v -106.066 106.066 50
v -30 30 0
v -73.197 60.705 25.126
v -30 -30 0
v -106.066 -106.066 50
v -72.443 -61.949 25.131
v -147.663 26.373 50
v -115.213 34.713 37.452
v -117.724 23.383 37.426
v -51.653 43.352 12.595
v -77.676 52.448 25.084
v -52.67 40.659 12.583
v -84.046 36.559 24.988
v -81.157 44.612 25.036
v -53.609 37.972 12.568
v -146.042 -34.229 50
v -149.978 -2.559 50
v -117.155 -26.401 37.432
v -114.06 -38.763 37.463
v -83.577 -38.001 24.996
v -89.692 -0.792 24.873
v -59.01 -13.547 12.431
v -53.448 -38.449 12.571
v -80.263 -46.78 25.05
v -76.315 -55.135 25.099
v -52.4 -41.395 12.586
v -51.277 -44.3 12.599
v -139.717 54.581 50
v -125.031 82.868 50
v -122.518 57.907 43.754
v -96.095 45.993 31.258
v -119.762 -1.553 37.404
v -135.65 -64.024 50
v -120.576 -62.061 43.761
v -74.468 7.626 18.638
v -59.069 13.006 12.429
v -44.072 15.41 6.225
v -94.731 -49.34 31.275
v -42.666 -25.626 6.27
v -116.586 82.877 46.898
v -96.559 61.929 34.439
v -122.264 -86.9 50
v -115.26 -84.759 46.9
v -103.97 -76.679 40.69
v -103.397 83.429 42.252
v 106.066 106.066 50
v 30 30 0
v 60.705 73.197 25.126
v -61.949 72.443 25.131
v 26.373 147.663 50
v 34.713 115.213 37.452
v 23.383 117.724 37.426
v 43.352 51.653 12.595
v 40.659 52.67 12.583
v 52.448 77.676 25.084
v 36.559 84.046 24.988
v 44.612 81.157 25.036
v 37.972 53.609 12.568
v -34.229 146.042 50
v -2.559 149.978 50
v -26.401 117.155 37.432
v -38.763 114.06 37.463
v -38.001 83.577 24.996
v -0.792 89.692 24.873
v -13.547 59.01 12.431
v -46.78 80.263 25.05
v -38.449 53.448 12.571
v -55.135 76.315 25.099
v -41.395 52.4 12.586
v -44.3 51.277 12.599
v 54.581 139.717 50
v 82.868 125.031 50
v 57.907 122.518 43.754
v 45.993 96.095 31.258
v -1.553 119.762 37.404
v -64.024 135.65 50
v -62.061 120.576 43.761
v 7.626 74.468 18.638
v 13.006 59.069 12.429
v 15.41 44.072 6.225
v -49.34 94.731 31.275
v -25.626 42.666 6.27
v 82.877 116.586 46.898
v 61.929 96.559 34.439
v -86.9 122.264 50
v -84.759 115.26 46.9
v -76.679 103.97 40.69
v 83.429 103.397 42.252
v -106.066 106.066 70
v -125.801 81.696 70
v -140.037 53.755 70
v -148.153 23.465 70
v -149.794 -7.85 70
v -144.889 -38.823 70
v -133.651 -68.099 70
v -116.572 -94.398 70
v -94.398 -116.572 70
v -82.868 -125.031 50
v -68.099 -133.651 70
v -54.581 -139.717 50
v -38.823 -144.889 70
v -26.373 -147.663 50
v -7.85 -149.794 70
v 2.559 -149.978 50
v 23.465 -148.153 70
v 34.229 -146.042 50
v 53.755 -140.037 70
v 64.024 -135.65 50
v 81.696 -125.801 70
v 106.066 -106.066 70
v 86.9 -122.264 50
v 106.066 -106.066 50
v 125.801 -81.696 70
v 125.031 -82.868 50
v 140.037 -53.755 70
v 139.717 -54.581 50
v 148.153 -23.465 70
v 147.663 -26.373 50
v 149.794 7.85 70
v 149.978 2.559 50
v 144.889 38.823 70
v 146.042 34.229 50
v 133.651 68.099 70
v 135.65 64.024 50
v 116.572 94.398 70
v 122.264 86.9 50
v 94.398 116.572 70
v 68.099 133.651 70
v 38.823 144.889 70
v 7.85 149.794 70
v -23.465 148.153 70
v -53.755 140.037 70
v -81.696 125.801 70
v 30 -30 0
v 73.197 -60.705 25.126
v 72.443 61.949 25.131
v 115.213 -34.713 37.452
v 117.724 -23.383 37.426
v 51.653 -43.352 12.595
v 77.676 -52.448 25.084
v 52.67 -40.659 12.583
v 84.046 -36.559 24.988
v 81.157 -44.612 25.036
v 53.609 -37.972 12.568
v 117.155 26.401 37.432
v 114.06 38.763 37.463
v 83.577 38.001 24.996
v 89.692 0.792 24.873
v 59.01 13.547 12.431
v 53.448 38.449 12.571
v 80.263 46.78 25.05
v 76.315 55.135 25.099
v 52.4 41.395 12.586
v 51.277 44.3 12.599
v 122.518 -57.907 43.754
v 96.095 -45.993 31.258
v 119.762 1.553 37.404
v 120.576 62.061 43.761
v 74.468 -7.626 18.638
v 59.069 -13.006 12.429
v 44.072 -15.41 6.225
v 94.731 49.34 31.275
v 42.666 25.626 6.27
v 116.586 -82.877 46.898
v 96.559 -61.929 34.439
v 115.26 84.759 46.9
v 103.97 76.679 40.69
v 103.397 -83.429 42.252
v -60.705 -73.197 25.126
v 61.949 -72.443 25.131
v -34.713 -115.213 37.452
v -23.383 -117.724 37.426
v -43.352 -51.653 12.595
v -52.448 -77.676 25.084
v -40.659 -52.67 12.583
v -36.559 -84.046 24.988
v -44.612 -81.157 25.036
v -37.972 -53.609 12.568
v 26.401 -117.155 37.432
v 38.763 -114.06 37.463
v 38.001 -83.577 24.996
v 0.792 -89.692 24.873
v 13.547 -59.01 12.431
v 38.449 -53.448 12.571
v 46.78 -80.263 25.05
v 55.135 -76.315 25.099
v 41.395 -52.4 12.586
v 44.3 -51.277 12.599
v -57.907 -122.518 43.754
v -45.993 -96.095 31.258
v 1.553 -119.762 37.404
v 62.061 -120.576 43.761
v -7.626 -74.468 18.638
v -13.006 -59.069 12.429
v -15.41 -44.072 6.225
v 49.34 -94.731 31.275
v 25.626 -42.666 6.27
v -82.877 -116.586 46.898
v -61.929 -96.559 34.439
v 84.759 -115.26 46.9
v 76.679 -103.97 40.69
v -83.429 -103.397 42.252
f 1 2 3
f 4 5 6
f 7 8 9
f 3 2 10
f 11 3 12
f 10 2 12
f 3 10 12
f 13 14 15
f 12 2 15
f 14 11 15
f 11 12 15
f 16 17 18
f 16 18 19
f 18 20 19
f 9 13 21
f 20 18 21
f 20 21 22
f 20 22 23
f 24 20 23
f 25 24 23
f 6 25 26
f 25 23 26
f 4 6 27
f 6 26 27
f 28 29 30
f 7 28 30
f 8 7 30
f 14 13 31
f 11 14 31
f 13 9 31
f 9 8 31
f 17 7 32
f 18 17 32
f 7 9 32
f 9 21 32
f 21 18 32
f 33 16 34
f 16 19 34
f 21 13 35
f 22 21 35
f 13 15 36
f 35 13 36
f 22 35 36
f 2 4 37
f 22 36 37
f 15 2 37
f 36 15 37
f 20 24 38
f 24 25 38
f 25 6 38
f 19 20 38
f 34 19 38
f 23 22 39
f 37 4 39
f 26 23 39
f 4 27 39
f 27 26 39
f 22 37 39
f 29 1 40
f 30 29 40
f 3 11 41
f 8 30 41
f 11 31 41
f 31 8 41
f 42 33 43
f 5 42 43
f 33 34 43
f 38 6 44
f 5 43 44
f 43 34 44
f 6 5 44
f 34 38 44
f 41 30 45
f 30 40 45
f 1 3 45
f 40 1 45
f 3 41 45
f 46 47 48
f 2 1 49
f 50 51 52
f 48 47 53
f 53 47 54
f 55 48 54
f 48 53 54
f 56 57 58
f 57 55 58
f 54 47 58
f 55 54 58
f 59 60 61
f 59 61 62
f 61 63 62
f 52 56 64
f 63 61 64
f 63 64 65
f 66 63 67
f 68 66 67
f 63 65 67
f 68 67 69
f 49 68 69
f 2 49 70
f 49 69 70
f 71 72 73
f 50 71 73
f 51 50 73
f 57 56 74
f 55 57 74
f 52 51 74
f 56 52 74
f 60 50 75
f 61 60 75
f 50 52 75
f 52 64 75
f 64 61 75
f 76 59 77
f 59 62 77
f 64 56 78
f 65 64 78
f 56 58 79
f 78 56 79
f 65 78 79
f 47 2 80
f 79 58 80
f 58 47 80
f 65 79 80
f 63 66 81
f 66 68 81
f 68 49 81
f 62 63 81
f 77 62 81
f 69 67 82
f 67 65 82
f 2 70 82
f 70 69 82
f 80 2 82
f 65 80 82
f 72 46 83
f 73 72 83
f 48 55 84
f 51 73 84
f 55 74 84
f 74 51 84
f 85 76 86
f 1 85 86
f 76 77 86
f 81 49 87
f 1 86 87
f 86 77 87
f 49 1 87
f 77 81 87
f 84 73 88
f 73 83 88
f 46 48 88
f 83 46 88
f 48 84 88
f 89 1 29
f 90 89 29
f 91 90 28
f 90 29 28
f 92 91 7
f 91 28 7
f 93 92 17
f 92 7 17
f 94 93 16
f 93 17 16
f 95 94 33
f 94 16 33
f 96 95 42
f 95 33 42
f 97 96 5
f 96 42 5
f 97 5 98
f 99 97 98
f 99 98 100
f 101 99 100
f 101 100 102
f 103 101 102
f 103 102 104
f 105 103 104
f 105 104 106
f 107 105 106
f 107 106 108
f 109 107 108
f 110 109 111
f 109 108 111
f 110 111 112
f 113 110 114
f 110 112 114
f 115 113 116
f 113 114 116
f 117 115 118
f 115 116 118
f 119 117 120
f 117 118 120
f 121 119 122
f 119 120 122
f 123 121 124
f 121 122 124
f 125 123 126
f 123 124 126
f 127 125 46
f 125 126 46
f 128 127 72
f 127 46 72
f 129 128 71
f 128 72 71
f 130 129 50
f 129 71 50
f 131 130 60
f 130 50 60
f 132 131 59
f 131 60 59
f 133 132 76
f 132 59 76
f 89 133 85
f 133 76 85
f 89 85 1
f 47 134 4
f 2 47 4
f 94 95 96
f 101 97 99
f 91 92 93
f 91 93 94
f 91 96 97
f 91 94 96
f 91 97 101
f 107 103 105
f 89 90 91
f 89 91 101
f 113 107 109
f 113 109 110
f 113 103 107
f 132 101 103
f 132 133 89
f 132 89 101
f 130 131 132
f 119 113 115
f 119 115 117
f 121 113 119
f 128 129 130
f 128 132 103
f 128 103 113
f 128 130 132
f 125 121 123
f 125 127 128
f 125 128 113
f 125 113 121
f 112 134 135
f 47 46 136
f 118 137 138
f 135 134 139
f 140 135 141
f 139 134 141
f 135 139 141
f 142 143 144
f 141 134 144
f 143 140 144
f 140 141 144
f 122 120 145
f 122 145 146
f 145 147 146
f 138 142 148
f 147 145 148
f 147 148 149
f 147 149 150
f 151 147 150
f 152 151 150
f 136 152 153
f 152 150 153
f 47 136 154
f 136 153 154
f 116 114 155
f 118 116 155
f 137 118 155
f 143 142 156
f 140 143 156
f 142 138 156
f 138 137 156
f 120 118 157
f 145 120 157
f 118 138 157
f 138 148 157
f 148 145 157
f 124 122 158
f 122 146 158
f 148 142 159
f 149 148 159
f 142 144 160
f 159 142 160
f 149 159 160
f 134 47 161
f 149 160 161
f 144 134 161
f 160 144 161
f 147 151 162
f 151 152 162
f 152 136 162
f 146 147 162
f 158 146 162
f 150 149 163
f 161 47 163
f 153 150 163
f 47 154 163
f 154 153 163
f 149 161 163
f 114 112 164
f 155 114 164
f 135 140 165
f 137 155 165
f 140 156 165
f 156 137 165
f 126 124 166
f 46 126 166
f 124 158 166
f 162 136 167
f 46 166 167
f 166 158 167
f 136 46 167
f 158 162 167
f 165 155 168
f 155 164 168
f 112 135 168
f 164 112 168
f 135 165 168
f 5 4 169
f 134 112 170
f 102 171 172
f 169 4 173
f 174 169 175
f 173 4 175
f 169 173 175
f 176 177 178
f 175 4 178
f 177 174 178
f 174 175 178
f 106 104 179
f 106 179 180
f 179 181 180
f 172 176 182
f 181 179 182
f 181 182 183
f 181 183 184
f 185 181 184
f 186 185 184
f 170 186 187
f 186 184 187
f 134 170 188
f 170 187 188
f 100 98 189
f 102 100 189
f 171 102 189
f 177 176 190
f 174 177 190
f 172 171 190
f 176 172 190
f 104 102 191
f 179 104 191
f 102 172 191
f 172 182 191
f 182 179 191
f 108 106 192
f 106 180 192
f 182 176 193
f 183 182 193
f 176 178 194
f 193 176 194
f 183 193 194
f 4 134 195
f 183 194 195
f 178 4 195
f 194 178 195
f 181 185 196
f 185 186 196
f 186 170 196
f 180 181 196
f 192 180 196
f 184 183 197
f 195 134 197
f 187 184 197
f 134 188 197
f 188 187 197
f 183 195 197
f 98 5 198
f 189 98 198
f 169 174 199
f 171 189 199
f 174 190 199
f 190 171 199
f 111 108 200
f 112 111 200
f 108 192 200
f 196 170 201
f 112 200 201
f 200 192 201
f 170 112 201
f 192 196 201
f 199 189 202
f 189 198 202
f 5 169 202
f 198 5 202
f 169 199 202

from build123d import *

# Parameters (mm, degrees)
SKETCH_1_W      = 60
SKETCH_1_H      = 60
EXTRUDE_1_DEPTH = 20


with BuildPart() as part:
    # 草图2 for 放样1 → 放样1 section 0
    with BuildSketch(Plane.XY.offset(50)):
        with BuildLine():
            # circular arc as an exact rational Bezier (weights 1, cos(half-angle), 1)
            Bezier((106.066017178, 106.066017178), (0, 212.132034356), (-106.066017178, 106.066017178), weights=[1, 0.707106781, 1])
            Bezier((-106.066017178, 106.066017178), (-212.132034356, 0), (-106.066017178, -106.066017178), weights=[1, 0.707106781, 1])
            Bezier((-106.066017178, -106.066017178), (0, -212.132034356), (106.066017178, -106.066017178), weights=[1, 0.707106781, 1])
            Bezier((106.066017178, -106.066017178), (212.132034356, 0), (106.066017178, 106.066017178), weights=[1, 0.707106781, 1])
        make_face()
    # 草图1 → 放样1 section 1
    with BuildSketch(Plane.XY):
        Rectangle(SKETCH_1_W, SKETCH_1_H)
    loft()

    # 草图3 → 凸台-拉伸1 (add)
    with BuildSketch(Plane.XY.offset(50)):
        with BuildLine():
            ThreePointArc((-106.066017178, -106.066017178), (0, -150), (106.066017178, -106.066017178))
            ThreePointArc((106.066017178, -106.066017178), (150, 0), (106.066017178, 106.066017178))
            ThreePointArc((106.066017178, 106.066017178), (0, 150), (-106.066017178, 106.066017178))
            ThreePointArc((-106.066017178, 106.066017178), (-150, 0), (-106.066017178, -106.066017178))
        make_face()
    extrude(amount=EXTRUDE_1_DEPTH)


solid = part.part
